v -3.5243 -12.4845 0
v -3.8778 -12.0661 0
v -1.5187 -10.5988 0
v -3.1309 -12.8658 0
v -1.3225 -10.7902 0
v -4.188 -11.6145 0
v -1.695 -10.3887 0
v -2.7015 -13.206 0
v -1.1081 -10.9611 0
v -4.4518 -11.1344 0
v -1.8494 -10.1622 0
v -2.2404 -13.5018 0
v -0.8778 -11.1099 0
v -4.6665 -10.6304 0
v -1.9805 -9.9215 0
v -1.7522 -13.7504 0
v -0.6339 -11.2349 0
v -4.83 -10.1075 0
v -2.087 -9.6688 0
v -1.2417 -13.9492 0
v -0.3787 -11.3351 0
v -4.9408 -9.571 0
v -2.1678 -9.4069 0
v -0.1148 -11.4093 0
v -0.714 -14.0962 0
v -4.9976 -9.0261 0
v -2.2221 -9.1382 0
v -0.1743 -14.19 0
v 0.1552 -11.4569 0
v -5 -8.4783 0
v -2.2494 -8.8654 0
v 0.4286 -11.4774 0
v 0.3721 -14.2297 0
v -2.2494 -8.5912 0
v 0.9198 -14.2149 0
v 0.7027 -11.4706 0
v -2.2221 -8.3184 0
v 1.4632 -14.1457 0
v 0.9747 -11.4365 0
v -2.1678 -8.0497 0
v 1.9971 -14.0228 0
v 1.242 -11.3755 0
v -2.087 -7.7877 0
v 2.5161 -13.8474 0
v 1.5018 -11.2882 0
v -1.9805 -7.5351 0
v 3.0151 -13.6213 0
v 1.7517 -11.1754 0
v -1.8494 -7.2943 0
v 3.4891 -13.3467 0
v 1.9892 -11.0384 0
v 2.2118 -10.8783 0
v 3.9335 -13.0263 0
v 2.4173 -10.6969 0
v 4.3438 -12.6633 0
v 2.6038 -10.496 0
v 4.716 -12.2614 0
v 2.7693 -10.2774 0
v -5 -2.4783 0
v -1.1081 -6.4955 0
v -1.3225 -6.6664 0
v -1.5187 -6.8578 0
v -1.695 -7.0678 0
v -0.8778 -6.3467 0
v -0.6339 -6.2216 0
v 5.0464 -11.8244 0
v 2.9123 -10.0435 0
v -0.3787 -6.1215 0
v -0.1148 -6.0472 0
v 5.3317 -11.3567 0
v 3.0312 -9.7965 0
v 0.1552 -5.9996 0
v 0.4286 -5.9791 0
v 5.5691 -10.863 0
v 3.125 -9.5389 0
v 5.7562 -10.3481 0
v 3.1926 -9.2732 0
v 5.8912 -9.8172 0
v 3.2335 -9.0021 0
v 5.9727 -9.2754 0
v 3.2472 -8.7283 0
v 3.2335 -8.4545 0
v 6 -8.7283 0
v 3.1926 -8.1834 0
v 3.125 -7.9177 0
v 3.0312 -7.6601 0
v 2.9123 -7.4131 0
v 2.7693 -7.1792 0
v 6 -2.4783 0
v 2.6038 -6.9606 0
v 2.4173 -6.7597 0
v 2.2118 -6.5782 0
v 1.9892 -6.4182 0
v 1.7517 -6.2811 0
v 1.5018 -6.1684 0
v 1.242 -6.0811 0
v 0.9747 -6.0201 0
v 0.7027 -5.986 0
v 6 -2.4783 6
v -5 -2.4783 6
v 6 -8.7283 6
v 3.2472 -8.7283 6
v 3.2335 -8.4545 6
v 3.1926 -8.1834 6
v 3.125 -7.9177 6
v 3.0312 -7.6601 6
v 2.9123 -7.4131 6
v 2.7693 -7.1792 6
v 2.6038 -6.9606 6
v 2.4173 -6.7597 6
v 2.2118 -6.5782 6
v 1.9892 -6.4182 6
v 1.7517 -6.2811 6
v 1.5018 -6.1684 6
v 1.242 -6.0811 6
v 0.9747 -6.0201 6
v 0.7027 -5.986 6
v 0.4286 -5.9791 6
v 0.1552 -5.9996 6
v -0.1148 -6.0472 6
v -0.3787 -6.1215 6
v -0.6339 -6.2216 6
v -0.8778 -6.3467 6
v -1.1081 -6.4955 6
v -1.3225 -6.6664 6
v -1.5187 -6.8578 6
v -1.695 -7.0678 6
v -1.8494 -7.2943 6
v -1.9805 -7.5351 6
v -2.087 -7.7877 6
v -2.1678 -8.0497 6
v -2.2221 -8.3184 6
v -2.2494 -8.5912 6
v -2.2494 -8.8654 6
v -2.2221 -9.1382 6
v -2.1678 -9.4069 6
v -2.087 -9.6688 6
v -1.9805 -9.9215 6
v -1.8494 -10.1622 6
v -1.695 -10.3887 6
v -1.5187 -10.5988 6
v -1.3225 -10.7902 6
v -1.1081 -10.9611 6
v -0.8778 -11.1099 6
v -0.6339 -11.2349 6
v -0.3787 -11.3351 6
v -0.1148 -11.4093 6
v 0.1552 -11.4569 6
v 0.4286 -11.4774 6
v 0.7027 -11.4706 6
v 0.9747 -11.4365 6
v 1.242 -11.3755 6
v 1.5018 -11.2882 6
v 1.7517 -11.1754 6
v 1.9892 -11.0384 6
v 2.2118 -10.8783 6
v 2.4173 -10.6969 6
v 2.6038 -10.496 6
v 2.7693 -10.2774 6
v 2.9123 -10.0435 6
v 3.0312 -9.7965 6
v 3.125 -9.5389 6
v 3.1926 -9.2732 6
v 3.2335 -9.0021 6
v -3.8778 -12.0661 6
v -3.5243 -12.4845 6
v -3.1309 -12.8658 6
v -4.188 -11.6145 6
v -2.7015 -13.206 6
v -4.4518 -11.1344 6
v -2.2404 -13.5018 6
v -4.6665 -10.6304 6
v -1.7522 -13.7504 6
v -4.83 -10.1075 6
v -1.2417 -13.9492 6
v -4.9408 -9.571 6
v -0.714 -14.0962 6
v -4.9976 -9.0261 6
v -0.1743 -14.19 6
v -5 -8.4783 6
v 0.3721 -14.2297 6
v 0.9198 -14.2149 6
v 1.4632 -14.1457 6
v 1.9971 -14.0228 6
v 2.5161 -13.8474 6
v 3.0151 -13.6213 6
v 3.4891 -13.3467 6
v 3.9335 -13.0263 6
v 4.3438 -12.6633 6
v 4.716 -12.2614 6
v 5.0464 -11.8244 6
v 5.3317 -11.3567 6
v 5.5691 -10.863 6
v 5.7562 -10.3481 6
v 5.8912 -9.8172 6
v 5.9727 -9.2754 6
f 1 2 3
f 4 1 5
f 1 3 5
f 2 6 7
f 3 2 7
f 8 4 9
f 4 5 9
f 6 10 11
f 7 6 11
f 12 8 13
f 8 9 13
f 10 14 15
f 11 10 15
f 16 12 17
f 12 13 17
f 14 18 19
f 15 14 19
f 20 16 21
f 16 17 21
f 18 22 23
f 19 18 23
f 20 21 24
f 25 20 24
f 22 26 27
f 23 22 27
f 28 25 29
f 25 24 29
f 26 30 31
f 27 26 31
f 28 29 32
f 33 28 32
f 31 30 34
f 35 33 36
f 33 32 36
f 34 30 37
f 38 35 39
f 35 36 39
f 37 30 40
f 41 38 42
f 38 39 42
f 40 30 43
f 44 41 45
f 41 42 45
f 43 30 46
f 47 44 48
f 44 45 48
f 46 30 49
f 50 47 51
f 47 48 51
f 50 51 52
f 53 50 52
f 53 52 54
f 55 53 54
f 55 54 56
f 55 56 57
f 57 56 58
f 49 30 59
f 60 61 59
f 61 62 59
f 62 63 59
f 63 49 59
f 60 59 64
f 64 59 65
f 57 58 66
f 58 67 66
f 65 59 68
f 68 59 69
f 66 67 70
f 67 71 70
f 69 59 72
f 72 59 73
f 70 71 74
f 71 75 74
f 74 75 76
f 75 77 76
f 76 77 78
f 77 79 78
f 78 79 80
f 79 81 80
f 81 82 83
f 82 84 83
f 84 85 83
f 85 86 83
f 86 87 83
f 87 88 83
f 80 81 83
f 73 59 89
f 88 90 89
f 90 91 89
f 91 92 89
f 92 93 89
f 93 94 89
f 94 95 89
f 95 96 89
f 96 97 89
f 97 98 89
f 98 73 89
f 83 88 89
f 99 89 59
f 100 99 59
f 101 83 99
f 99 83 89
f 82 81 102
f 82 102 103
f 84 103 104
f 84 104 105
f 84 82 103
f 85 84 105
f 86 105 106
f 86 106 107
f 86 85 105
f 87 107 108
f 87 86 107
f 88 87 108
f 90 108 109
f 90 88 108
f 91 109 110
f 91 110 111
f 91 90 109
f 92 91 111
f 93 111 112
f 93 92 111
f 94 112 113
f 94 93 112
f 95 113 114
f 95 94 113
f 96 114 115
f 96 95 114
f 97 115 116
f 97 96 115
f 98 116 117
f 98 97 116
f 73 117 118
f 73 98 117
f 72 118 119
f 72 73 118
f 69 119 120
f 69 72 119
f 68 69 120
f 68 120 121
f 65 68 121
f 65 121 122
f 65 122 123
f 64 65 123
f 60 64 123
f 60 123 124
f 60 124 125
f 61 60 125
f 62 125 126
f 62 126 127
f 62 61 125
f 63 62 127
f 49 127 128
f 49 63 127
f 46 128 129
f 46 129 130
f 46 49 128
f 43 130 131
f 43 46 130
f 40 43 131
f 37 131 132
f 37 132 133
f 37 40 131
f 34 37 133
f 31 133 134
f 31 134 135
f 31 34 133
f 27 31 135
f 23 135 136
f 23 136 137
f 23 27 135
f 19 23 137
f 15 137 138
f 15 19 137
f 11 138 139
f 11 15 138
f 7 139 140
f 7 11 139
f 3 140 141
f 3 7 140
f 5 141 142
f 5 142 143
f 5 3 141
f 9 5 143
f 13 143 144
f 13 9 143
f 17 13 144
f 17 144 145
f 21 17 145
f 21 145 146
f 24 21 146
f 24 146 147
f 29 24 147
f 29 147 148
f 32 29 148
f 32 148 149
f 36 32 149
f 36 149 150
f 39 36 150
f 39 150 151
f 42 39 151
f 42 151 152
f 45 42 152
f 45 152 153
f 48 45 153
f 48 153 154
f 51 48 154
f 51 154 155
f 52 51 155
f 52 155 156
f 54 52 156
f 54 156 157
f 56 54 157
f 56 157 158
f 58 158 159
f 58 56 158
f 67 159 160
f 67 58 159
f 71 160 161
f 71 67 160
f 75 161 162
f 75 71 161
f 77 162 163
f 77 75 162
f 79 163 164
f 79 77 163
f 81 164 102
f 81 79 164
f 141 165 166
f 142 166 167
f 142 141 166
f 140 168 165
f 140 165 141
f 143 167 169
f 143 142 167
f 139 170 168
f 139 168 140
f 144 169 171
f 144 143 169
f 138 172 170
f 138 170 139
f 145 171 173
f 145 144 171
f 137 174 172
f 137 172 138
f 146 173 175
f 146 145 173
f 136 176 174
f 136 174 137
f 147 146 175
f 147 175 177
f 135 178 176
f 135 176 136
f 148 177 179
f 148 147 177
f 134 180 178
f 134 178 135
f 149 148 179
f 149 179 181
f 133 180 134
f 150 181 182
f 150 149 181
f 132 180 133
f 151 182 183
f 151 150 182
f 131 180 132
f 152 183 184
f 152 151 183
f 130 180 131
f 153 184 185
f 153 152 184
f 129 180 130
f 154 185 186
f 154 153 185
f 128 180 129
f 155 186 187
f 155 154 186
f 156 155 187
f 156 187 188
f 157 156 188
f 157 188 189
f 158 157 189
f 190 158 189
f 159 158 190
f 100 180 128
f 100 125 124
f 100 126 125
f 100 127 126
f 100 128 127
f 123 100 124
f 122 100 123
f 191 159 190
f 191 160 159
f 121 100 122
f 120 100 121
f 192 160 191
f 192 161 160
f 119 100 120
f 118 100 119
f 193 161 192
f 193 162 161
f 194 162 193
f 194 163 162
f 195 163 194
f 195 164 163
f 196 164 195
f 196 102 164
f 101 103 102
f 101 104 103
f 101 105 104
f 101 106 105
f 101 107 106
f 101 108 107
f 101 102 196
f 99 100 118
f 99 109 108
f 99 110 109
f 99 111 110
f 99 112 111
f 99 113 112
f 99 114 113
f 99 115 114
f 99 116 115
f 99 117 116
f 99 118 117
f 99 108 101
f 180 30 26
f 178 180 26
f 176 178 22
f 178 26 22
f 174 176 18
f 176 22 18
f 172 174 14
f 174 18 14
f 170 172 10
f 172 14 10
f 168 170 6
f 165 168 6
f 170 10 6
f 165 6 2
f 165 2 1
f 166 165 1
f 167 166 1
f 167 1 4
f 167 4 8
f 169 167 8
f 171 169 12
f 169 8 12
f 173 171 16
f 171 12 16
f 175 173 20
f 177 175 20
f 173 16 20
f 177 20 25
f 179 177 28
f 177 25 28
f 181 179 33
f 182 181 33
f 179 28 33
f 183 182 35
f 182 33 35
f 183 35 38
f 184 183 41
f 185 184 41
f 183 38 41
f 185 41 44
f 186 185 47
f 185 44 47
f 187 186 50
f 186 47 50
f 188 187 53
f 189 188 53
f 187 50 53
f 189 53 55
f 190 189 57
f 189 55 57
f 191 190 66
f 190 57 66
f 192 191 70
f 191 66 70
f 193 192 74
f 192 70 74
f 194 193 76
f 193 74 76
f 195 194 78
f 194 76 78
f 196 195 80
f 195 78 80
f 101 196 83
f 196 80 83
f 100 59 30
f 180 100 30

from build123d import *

# Parameters (mm, degrees)
F0_R     = 2.75
F1_DEPTH = 6


with BuildPart() as f1:
    # F0 (on Top) → F1 (new body)
    with BuildSketch(Plane.XY):
        with BuildLine():
            Line((6.000003, -2.478286), (-4.999997, -2.478286))
            Line((-4.999997, -2.478286), (-4.999997, -8.478286))
            ThreePointArc((-4.999997, -8.478286), (0.37213, -14.229707), (6.000003, -8.728286))
            Line((6.000003, -8.728286), (6.000003, -2.478286))
        make_face()
        with Locations((0.497162, -8.728286)):
            Circle(F0_R, mode=Mode.SUBTRACT)
    extrude(amount=F1_DEPTH)


solid = f1.part
